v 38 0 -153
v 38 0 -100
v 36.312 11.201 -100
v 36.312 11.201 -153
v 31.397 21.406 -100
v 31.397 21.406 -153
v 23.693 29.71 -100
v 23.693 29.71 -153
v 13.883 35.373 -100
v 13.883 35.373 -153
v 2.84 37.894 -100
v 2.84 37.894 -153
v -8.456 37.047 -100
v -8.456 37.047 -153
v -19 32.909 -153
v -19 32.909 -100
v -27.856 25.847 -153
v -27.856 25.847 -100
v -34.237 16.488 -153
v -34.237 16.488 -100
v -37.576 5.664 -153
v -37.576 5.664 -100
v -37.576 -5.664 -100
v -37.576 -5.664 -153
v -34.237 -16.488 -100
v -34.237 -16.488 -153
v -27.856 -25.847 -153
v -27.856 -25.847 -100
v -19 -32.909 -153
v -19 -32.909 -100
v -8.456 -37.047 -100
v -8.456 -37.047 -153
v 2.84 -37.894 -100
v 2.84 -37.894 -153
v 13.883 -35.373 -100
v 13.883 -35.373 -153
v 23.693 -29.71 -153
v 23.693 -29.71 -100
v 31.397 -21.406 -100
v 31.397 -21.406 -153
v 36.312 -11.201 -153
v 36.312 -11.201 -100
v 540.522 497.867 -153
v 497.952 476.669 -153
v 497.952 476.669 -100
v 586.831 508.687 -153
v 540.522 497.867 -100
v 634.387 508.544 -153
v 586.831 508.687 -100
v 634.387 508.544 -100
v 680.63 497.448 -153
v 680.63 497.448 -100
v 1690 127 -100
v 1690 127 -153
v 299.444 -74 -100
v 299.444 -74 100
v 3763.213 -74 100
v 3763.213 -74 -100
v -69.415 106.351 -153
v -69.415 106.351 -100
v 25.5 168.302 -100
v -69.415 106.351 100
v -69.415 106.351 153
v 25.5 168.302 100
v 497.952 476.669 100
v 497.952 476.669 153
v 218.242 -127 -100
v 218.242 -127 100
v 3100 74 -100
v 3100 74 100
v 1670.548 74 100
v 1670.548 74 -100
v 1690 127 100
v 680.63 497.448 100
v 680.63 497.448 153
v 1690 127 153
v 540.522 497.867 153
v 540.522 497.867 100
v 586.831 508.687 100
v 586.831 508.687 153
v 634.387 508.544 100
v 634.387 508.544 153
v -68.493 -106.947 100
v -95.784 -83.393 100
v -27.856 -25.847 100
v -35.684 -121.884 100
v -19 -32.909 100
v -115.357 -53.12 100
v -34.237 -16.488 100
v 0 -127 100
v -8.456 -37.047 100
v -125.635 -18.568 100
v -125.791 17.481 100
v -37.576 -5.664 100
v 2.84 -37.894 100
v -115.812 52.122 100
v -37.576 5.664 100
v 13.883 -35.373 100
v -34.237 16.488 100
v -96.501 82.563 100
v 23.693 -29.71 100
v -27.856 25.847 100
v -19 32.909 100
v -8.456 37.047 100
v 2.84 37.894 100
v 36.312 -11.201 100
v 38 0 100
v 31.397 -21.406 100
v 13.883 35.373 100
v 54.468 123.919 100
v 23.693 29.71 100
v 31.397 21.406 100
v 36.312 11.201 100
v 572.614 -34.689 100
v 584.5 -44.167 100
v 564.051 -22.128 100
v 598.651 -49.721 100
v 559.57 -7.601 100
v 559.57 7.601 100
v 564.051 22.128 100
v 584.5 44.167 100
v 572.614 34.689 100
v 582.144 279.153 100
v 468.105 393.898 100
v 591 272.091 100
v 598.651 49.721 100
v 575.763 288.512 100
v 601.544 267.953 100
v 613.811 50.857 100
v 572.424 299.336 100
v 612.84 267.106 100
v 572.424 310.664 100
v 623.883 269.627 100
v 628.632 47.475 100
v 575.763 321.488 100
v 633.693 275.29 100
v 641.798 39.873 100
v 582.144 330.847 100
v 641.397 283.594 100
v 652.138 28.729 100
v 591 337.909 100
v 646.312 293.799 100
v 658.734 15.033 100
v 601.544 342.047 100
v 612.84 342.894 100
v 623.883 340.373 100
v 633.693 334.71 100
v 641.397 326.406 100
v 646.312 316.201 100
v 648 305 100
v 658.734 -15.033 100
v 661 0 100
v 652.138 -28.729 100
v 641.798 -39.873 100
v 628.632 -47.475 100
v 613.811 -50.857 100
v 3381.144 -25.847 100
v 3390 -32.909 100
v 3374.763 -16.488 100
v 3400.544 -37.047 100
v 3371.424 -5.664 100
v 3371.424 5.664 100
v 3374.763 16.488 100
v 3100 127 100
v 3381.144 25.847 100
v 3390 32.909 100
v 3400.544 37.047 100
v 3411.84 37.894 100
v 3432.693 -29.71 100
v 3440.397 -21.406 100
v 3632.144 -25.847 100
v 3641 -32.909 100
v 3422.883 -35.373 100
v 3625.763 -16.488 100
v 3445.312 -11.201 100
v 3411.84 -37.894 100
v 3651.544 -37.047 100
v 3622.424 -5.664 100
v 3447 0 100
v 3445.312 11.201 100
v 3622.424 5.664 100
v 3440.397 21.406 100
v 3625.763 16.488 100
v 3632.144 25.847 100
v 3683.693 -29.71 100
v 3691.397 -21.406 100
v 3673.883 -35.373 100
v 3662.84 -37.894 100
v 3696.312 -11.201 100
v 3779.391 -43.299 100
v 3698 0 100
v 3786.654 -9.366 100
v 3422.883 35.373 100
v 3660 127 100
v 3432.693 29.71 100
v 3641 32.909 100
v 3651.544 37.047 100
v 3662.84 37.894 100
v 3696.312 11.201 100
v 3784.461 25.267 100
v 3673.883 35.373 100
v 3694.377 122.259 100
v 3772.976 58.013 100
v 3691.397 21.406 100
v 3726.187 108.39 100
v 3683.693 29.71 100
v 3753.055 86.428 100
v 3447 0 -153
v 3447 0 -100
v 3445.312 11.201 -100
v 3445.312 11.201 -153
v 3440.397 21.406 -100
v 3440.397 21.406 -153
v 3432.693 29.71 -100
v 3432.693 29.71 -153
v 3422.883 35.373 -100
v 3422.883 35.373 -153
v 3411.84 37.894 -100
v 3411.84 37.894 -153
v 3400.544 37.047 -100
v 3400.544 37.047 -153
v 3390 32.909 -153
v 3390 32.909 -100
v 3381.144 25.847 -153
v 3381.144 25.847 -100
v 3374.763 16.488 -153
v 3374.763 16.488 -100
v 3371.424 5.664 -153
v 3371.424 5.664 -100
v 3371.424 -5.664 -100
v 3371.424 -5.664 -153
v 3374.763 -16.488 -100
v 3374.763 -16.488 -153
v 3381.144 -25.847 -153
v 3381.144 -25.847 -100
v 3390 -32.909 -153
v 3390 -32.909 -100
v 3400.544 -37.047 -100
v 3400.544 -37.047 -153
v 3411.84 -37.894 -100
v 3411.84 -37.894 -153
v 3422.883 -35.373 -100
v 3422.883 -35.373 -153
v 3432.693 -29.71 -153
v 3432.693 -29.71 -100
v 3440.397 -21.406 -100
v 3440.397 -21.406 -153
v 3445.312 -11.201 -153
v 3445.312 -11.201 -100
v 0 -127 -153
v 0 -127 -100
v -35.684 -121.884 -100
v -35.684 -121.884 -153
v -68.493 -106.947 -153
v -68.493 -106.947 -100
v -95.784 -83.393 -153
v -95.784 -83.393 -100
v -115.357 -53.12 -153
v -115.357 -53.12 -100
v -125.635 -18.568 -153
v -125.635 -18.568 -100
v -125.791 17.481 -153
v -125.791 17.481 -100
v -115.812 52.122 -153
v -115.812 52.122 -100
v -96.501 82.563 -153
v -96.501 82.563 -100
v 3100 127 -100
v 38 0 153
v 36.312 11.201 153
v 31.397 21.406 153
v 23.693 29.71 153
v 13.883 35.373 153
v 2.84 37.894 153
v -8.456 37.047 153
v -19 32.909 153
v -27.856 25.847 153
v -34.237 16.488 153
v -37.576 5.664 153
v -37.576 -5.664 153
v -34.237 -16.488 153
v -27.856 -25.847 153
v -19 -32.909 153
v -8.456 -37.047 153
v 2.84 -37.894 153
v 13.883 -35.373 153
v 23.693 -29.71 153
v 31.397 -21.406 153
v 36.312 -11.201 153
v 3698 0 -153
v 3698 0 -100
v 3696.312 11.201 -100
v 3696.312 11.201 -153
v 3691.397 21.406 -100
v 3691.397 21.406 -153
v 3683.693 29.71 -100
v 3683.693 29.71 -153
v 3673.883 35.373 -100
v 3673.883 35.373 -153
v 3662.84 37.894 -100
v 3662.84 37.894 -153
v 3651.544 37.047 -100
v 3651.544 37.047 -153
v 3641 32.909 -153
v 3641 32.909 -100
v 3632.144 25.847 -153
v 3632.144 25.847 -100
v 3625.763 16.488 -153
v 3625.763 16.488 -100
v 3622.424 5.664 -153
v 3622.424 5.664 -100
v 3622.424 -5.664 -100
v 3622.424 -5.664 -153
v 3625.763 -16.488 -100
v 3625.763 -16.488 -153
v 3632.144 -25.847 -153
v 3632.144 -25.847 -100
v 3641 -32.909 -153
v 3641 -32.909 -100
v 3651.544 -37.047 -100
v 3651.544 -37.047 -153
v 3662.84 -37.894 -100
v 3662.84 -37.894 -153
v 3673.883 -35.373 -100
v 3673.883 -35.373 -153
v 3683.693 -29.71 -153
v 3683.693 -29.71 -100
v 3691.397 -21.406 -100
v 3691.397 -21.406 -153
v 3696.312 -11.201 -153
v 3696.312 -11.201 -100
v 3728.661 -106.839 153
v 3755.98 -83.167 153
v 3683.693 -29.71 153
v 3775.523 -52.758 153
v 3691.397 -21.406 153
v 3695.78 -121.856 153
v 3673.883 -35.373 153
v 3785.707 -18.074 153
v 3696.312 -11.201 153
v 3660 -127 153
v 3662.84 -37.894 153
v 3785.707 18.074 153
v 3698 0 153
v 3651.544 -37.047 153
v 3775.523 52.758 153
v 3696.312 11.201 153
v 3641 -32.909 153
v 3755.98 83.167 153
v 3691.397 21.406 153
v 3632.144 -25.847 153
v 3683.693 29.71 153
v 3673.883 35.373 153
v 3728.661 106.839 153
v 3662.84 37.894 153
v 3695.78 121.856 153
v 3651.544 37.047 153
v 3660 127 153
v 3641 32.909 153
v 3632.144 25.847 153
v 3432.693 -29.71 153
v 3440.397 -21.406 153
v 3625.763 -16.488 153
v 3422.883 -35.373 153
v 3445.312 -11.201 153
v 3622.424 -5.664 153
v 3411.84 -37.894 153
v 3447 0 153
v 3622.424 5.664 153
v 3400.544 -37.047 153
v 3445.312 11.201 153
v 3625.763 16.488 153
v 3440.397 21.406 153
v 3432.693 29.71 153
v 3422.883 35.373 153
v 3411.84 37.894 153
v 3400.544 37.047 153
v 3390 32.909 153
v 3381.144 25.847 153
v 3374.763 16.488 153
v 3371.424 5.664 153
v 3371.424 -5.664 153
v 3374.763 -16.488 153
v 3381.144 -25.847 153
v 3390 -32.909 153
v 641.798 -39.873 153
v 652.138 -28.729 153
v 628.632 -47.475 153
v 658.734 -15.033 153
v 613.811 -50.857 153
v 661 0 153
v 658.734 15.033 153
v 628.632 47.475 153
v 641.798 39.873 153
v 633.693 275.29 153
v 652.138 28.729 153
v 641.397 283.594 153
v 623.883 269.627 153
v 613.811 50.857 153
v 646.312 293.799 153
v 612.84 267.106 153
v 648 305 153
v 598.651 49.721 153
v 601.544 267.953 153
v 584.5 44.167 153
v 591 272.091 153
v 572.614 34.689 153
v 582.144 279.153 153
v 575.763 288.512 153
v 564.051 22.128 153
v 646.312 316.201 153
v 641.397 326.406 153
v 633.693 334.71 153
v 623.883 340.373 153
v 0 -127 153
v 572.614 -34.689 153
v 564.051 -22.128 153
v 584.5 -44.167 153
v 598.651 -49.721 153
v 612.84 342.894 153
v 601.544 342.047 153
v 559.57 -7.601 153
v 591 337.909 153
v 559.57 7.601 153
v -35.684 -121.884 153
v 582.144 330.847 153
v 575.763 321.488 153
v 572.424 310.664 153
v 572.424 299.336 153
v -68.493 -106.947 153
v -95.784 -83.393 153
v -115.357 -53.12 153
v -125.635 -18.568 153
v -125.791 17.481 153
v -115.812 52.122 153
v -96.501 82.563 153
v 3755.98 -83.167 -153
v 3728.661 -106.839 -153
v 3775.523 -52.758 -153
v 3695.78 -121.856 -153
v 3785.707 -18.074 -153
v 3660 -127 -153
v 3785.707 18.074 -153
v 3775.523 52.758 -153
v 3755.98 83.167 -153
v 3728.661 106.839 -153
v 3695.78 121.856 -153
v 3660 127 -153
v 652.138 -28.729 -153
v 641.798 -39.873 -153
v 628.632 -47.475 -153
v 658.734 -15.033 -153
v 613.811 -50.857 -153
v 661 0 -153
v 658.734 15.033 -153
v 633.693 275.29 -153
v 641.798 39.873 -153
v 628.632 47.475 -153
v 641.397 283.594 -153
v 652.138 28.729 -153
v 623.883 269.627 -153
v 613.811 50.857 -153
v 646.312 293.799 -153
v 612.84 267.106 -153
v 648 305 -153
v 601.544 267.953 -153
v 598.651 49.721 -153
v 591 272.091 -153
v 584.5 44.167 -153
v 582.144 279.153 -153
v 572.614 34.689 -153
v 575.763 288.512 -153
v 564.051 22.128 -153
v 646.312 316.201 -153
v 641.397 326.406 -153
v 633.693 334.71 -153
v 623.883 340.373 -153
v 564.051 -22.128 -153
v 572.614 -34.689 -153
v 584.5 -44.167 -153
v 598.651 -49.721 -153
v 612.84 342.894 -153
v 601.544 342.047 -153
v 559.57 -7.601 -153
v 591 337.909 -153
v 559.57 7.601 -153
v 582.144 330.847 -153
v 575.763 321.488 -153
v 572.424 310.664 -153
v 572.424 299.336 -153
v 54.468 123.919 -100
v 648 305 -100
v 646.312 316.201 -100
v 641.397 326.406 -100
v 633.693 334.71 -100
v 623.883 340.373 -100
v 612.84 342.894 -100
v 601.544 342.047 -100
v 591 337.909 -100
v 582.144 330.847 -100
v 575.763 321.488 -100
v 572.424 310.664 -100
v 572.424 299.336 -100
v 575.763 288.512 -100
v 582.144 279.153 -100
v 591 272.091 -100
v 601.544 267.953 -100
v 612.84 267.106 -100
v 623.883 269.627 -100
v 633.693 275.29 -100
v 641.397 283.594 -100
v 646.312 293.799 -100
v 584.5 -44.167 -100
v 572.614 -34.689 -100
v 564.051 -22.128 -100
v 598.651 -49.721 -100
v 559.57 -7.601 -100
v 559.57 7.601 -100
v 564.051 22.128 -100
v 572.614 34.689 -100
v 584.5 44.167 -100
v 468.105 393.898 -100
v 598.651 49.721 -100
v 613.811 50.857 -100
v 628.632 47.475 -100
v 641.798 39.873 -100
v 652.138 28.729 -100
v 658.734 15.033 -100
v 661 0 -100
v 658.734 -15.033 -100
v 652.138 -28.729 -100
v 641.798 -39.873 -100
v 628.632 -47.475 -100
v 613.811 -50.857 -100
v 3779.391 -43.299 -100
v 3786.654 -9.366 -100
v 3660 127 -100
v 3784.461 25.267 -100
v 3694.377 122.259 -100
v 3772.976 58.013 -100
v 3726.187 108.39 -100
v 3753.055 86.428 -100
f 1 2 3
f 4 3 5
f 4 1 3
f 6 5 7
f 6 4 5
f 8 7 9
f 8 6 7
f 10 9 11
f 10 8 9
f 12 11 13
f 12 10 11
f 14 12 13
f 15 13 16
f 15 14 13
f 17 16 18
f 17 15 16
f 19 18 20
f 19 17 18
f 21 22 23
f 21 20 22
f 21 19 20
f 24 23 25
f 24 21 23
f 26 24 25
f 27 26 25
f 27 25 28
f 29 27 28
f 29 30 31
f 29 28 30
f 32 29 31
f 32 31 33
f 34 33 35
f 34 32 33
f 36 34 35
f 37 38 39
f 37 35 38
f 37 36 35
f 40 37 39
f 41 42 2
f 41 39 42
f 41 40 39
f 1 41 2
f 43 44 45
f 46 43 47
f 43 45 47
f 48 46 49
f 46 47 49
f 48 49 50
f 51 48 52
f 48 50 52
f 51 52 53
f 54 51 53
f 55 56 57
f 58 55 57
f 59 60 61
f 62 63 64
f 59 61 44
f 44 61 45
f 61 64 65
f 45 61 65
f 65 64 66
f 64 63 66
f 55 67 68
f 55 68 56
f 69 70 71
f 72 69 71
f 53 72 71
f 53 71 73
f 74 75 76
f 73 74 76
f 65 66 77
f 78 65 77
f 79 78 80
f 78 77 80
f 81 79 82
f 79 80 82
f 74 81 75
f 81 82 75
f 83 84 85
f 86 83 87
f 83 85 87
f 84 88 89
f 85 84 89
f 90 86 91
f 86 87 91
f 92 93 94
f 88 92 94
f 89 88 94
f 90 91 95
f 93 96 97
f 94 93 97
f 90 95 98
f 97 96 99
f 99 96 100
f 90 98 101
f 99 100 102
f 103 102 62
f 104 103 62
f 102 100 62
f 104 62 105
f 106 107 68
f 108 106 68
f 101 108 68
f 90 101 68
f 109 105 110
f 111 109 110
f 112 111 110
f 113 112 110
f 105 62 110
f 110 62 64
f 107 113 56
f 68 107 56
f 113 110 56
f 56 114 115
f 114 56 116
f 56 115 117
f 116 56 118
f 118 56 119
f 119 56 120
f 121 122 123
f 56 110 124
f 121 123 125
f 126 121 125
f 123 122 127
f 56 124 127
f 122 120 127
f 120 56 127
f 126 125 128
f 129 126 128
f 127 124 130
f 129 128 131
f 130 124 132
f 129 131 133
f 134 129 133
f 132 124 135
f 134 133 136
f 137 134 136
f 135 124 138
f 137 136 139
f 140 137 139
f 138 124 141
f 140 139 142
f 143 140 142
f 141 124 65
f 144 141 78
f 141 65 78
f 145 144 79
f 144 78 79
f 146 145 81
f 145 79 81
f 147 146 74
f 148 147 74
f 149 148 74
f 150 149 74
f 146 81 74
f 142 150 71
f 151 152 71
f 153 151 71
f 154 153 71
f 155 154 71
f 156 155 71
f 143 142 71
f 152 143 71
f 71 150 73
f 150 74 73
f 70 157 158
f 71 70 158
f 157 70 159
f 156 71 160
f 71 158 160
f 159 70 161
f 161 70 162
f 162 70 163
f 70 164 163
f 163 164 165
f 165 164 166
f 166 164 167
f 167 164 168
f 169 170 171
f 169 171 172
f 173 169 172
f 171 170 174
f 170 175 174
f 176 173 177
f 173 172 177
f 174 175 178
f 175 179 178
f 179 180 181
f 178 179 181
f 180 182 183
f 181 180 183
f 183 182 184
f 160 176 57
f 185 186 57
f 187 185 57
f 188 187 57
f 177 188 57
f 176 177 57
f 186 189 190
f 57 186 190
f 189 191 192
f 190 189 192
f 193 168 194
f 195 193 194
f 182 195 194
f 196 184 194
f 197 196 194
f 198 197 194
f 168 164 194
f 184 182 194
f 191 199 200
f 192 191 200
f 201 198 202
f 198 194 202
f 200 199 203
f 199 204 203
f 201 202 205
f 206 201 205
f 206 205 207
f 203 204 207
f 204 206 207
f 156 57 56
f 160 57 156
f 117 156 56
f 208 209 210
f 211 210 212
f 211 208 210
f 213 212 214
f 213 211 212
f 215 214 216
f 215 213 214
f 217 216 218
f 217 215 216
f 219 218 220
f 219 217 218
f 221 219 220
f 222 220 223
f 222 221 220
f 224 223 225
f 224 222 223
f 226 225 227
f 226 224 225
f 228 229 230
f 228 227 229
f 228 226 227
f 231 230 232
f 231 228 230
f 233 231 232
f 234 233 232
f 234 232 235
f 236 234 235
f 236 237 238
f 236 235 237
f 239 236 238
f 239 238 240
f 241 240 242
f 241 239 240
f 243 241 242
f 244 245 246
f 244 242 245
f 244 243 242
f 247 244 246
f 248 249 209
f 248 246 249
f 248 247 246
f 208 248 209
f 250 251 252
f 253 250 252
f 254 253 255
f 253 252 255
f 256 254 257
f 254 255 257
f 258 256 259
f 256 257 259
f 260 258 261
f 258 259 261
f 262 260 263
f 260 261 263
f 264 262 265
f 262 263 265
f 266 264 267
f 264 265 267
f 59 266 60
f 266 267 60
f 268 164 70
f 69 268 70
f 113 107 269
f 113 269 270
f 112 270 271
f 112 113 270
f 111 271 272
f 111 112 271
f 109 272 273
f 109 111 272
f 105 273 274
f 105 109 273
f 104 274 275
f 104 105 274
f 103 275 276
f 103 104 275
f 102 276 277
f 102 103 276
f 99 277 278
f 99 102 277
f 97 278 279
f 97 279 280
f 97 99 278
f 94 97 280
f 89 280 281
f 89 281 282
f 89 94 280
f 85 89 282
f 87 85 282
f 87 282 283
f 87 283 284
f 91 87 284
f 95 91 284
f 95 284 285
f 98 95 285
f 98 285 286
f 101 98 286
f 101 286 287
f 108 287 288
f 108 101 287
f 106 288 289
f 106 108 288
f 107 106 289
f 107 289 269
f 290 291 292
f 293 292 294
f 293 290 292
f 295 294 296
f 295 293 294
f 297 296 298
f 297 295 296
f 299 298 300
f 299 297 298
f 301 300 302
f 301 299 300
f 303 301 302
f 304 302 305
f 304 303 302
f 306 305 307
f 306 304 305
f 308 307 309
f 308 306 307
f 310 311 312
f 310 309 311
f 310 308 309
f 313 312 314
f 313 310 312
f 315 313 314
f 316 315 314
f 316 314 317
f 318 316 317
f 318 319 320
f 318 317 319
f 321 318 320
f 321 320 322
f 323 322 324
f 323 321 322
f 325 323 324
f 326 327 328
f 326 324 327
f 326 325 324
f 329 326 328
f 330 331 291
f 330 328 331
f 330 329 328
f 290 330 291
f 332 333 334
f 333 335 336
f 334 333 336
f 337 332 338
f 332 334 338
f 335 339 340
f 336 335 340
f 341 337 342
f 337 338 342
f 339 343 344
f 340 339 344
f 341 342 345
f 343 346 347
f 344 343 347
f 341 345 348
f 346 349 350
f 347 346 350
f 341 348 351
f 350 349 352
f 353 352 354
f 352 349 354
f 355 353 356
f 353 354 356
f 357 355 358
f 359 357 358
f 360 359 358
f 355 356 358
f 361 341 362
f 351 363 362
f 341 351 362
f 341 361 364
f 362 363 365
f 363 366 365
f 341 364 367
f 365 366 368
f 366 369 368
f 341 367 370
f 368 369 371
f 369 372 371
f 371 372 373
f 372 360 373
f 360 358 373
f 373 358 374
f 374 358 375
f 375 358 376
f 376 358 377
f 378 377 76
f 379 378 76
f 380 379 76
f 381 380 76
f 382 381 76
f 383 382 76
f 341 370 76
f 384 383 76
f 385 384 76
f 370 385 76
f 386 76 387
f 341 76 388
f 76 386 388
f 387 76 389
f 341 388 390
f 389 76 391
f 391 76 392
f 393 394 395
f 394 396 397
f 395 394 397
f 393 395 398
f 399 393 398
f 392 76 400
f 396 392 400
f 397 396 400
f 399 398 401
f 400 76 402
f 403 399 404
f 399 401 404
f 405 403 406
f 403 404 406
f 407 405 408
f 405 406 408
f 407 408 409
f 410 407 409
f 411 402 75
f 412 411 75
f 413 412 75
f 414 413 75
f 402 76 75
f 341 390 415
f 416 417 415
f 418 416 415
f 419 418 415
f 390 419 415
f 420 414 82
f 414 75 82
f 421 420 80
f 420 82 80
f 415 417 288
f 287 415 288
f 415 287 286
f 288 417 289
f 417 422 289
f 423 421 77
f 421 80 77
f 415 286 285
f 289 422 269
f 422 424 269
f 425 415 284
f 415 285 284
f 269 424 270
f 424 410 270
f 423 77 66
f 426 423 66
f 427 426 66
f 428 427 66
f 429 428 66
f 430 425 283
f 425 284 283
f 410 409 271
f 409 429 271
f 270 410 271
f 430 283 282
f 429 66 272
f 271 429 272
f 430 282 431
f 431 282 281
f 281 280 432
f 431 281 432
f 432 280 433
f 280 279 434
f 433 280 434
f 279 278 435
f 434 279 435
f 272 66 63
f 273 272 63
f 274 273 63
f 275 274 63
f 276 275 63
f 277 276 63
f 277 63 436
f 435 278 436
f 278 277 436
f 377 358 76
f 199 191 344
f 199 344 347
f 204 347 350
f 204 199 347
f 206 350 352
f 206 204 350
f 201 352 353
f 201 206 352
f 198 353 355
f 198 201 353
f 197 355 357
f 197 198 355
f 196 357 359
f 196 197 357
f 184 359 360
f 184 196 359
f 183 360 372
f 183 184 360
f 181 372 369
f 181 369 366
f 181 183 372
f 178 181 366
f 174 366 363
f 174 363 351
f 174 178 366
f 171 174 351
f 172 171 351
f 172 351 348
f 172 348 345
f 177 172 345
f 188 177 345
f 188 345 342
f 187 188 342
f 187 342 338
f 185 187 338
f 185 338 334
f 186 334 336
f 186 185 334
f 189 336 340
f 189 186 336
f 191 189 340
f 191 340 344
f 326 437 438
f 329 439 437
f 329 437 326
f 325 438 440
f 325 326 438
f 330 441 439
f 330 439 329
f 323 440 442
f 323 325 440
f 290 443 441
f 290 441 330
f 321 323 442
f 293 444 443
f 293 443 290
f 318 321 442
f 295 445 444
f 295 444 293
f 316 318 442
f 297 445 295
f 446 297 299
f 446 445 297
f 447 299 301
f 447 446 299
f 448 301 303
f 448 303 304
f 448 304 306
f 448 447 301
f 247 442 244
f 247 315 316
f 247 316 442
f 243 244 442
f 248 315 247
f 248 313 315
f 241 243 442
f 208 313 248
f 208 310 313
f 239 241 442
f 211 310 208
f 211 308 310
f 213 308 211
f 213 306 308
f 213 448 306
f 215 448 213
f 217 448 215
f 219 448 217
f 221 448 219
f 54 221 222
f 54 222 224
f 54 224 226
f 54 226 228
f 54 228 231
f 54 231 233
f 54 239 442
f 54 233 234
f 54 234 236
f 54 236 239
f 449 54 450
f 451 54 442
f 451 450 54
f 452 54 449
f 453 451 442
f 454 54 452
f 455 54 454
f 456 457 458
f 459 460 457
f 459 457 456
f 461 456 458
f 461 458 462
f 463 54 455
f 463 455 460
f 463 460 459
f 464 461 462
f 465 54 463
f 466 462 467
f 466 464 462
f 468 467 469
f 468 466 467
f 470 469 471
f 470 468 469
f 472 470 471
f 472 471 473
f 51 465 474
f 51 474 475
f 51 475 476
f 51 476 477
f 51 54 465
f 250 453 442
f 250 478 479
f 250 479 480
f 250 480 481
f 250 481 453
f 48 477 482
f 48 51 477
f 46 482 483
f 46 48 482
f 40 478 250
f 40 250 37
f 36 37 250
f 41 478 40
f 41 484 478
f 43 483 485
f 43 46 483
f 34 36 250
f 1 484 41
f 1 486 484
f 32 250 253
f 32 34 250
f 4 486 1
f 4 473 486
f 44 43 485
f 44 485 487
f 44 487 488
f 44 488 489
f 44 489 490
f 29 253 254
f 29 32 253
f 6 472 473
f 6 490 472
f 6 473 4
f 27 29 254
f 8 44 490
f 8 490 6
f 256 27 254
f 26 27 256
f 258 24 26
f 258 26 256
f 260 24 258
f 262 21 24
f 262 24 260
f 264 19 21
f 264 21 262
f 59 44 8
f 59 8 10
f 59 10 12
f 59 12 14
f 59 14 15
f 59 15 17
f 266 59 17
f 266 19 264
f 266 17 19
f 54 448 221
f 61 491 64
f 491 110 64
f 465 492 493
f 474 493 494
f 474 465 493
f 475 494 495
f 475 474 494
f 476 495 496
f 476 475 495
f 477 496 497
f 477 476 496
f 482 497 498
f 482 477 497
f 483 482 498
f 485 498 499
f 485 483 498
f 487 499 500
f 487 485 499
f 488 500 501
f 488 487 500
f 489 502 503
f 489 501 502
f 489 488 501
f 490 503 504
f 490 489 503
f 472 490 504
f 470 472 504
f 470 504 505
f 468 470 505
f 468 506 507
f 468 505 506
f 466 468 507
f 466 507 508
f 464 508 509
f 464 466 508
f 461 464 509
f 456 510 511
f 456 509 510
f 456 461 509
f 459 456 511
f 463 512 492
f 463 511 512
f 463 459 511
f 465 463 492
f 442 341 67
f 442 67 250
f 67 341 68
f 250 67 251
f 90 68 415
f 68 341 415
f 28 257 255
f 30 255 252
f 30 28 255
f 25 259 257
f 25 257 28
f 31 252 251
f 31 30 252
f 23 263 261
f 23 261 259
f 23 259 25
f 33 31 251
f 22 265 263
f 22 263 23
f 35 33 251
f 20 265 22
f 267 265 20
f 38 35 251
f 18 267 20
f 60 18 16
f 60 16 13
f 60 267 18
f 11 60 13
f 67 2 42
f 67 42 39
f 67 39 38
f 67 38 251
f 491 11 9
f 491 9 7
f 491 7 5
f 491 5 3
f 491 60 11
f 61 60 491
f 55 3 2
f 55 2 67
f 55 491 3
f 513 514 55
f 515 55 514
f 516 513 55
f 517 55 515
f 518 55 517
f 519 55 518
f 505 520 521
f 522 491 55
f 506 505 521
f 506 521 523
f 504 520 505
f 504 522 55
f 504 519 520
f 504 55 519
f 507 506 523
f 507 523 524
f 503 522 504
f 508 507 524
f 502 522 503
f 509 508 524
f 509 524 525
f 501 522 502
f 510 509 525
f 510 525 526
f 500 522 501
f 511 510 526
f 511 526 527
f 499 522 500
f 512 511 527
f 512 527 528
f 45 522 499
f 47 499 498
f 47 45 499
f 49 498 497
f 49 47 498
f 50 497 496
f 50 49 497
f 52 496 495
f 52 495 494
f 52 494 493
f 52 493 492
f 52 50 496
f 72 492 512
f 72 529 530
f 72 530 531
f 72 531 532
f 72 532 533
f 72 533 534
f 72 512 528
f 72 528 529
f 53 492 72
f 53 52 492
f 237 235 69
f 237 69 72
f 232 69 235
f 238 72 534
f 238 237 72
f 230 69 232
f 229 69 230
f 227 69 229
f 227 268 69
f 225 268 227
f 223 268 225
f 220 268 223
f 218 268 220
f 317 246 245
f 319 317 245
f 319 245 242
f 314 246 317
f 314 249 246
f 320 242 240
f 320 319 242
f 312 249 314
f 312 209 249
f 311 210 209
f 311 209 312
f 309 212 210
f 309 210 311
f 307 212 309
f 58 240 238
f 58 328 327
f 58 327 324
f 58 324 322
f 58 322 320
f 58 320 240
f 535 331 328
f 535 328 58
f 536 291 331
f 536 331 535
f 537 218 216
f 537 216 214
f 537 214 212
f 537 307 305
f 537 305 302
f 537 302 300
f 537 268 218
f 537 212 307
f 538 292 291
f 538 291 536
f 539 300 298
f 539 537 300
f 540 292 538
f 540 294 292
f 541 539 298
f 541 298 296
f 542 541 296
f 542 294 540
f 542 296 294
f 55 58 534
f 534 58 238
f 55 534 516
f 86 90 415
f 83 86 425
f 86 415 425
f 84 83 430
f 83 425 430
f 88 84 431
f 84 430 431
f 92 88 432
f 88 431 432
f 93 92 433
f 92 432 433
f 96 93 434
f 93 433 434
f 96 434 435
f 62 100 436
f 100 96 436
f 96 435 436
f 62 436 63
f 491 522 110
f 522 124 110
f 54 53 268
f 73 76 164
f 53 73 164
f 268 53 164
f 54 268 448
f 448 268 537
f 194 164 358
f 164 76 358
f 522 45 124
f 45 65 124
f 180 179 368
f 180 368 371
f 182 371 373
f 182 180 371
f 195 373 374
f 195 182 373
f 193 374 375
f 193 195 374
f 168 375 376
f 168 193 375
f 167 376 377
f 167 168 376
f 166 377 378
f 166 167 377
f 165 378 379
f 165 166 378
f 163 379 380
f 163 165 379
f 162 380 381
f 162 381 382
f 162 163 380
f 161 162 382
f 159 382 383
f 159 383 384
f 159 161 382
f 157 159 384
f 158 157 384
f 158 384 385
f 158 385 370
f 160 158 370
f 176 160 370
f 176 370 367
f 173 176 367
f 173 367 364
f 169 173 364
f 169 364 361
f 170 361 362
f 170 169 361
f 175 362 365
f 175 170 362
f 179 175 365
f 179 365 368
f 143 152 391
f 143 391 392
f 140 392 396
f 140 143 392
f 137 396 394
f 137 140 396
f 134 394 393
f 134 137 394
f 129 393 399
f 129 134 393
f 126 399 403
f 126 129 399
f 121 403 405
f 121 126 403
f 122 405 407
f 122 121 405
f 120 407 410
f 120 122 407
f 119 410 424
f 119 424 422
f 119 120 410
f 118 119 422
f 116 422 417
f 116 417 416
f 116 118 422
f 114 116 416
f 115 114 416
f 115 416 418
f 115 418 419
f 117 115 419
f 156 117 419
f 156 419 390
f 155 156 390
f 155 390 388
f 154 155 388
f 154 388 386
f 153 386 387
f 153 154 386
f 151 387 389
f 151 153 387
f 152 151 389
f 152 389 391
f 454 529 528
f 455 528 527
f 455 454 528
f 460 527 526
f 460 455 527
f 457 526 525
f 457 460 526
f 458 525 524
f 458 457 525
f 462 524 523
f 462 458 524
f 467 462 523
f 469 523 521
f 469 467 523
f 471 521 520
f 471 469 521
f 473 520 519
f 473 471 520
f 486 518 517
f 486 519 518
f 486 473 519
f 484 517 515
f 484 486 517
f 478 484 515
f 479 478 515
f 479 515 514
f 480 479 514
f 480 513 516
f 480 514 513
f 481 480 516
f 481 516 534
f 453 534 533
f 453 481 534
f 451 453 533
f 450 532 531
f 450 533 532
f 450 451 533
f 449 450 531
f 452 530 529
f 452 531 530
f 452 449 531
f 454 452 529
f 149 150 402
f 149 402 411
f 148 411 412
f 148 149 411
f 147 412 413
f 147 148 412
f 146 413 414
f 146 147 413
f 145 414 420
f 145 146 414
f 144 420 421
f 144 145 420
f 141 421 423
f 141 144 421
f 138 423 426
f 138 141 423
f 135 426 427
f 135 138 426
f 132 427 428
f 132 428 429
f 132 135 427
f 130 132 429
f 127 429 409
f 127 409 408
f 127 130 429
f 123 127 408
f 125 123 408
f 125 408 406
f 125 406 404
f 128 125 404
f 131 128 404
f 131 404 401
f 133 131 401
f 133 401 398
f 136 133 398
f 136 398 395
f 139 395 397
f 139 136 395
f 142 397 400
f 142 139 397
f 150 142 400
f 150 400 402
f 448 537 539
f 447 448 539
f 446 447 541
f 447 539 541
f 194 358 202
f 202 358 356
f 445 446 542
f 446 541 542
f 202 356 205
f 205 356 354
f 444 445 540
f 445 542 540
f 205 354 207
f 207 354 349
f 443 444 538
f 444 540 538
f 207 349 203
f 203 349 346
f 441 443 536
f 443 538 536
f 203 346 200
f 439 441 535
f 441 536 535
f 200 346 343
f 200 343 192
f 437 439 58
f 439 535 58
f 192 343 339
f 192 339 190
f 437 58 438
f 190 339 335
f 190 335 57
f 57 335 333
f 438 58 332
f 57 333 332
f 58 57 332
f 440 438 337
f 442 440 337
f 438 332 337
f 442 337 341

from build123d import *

# Parameters (mm, degrees)
SKETCH1_R           = 38
SKETCH1_R_2         = 51
BOSS_EXTRUDE1_DEPTH = 153
CUT_EXTRUDE1_DEPTH  = 100


with BuildPart() as part:
    # Sketch1 → Boss-Extrude1 (new, symmetric)
    with BuildSketch(Plane.XY):
        with BuildLine():
            Line((-69.41492259, 106.351156655), (497.952290308, 476.669189876))
            ThreePointArc((497.952290308, 476.669189876), (586.831228911, 508.686543606), (680.630369154, 497.448307224))
            Line((680.630369154, 497.448307224), (1690, 127))
            Line((1690, 127), (3660, 127))
            ThreePointArc((3660, 127), (3787, 0), (3660, -127))
            Line((3660, -127), (0, -127))
            ThreePointArc((0, -127), (-121.728379795, -36.210517152), (-69.41492259, 106.351156655))
        make_face()
        Circle(SKETCH1_R, mode=Mode.SUBTRACT)
        with Locations((610, 0)):
            Circle(SKETCH1_R_2, mode=Mode.SUBTRACT)
        with Locations((610, 305)):
            Circle(SKETCH1_R, mode=Mode.SUBTRACT)
        with Locations((3409, 0)):
            Circle(SKETCH1_R, mode=Mode.SUBTRACT)
        with Locations((3660, 0)):
            Circle(SKETCH1_R, mode=Mode.SUBTRACT)
    extrude(amount=BOSS_EXTRUDE1_DEPTH, both=True)

    # Sketch2 → Cut-Extrude1 (cut, symmetric)
    with BuildSketch(Plane.XY):
        Polygon((54.468432262, 123.918934439), (25.5, 168.301700602), (25.5, 441.704225578), (-335.578738739, 441.704225578), (-335.578738739, -282.733576461), (218.242094516, -282.733576461), (218.242094516, -127), (299.443817322, -74), (3763.213371227, -74), (4168.773290142, -74), (4168.773290142, 728.333745917), (3100, 728.333745917), (3100, 127), (3100, 74), (1670.548493156, 74), (1690, 127), (1690, 728.333745917), (497.952290308, 728.333745917), (497.952290308, 476.669189876), (468.104782812, 393.897523829), align=None)
    extrude(amount=CUT_EXTRUDE1_DEPTH, both=True, mode=Mode.SUBTRACT)


solid = part.part
